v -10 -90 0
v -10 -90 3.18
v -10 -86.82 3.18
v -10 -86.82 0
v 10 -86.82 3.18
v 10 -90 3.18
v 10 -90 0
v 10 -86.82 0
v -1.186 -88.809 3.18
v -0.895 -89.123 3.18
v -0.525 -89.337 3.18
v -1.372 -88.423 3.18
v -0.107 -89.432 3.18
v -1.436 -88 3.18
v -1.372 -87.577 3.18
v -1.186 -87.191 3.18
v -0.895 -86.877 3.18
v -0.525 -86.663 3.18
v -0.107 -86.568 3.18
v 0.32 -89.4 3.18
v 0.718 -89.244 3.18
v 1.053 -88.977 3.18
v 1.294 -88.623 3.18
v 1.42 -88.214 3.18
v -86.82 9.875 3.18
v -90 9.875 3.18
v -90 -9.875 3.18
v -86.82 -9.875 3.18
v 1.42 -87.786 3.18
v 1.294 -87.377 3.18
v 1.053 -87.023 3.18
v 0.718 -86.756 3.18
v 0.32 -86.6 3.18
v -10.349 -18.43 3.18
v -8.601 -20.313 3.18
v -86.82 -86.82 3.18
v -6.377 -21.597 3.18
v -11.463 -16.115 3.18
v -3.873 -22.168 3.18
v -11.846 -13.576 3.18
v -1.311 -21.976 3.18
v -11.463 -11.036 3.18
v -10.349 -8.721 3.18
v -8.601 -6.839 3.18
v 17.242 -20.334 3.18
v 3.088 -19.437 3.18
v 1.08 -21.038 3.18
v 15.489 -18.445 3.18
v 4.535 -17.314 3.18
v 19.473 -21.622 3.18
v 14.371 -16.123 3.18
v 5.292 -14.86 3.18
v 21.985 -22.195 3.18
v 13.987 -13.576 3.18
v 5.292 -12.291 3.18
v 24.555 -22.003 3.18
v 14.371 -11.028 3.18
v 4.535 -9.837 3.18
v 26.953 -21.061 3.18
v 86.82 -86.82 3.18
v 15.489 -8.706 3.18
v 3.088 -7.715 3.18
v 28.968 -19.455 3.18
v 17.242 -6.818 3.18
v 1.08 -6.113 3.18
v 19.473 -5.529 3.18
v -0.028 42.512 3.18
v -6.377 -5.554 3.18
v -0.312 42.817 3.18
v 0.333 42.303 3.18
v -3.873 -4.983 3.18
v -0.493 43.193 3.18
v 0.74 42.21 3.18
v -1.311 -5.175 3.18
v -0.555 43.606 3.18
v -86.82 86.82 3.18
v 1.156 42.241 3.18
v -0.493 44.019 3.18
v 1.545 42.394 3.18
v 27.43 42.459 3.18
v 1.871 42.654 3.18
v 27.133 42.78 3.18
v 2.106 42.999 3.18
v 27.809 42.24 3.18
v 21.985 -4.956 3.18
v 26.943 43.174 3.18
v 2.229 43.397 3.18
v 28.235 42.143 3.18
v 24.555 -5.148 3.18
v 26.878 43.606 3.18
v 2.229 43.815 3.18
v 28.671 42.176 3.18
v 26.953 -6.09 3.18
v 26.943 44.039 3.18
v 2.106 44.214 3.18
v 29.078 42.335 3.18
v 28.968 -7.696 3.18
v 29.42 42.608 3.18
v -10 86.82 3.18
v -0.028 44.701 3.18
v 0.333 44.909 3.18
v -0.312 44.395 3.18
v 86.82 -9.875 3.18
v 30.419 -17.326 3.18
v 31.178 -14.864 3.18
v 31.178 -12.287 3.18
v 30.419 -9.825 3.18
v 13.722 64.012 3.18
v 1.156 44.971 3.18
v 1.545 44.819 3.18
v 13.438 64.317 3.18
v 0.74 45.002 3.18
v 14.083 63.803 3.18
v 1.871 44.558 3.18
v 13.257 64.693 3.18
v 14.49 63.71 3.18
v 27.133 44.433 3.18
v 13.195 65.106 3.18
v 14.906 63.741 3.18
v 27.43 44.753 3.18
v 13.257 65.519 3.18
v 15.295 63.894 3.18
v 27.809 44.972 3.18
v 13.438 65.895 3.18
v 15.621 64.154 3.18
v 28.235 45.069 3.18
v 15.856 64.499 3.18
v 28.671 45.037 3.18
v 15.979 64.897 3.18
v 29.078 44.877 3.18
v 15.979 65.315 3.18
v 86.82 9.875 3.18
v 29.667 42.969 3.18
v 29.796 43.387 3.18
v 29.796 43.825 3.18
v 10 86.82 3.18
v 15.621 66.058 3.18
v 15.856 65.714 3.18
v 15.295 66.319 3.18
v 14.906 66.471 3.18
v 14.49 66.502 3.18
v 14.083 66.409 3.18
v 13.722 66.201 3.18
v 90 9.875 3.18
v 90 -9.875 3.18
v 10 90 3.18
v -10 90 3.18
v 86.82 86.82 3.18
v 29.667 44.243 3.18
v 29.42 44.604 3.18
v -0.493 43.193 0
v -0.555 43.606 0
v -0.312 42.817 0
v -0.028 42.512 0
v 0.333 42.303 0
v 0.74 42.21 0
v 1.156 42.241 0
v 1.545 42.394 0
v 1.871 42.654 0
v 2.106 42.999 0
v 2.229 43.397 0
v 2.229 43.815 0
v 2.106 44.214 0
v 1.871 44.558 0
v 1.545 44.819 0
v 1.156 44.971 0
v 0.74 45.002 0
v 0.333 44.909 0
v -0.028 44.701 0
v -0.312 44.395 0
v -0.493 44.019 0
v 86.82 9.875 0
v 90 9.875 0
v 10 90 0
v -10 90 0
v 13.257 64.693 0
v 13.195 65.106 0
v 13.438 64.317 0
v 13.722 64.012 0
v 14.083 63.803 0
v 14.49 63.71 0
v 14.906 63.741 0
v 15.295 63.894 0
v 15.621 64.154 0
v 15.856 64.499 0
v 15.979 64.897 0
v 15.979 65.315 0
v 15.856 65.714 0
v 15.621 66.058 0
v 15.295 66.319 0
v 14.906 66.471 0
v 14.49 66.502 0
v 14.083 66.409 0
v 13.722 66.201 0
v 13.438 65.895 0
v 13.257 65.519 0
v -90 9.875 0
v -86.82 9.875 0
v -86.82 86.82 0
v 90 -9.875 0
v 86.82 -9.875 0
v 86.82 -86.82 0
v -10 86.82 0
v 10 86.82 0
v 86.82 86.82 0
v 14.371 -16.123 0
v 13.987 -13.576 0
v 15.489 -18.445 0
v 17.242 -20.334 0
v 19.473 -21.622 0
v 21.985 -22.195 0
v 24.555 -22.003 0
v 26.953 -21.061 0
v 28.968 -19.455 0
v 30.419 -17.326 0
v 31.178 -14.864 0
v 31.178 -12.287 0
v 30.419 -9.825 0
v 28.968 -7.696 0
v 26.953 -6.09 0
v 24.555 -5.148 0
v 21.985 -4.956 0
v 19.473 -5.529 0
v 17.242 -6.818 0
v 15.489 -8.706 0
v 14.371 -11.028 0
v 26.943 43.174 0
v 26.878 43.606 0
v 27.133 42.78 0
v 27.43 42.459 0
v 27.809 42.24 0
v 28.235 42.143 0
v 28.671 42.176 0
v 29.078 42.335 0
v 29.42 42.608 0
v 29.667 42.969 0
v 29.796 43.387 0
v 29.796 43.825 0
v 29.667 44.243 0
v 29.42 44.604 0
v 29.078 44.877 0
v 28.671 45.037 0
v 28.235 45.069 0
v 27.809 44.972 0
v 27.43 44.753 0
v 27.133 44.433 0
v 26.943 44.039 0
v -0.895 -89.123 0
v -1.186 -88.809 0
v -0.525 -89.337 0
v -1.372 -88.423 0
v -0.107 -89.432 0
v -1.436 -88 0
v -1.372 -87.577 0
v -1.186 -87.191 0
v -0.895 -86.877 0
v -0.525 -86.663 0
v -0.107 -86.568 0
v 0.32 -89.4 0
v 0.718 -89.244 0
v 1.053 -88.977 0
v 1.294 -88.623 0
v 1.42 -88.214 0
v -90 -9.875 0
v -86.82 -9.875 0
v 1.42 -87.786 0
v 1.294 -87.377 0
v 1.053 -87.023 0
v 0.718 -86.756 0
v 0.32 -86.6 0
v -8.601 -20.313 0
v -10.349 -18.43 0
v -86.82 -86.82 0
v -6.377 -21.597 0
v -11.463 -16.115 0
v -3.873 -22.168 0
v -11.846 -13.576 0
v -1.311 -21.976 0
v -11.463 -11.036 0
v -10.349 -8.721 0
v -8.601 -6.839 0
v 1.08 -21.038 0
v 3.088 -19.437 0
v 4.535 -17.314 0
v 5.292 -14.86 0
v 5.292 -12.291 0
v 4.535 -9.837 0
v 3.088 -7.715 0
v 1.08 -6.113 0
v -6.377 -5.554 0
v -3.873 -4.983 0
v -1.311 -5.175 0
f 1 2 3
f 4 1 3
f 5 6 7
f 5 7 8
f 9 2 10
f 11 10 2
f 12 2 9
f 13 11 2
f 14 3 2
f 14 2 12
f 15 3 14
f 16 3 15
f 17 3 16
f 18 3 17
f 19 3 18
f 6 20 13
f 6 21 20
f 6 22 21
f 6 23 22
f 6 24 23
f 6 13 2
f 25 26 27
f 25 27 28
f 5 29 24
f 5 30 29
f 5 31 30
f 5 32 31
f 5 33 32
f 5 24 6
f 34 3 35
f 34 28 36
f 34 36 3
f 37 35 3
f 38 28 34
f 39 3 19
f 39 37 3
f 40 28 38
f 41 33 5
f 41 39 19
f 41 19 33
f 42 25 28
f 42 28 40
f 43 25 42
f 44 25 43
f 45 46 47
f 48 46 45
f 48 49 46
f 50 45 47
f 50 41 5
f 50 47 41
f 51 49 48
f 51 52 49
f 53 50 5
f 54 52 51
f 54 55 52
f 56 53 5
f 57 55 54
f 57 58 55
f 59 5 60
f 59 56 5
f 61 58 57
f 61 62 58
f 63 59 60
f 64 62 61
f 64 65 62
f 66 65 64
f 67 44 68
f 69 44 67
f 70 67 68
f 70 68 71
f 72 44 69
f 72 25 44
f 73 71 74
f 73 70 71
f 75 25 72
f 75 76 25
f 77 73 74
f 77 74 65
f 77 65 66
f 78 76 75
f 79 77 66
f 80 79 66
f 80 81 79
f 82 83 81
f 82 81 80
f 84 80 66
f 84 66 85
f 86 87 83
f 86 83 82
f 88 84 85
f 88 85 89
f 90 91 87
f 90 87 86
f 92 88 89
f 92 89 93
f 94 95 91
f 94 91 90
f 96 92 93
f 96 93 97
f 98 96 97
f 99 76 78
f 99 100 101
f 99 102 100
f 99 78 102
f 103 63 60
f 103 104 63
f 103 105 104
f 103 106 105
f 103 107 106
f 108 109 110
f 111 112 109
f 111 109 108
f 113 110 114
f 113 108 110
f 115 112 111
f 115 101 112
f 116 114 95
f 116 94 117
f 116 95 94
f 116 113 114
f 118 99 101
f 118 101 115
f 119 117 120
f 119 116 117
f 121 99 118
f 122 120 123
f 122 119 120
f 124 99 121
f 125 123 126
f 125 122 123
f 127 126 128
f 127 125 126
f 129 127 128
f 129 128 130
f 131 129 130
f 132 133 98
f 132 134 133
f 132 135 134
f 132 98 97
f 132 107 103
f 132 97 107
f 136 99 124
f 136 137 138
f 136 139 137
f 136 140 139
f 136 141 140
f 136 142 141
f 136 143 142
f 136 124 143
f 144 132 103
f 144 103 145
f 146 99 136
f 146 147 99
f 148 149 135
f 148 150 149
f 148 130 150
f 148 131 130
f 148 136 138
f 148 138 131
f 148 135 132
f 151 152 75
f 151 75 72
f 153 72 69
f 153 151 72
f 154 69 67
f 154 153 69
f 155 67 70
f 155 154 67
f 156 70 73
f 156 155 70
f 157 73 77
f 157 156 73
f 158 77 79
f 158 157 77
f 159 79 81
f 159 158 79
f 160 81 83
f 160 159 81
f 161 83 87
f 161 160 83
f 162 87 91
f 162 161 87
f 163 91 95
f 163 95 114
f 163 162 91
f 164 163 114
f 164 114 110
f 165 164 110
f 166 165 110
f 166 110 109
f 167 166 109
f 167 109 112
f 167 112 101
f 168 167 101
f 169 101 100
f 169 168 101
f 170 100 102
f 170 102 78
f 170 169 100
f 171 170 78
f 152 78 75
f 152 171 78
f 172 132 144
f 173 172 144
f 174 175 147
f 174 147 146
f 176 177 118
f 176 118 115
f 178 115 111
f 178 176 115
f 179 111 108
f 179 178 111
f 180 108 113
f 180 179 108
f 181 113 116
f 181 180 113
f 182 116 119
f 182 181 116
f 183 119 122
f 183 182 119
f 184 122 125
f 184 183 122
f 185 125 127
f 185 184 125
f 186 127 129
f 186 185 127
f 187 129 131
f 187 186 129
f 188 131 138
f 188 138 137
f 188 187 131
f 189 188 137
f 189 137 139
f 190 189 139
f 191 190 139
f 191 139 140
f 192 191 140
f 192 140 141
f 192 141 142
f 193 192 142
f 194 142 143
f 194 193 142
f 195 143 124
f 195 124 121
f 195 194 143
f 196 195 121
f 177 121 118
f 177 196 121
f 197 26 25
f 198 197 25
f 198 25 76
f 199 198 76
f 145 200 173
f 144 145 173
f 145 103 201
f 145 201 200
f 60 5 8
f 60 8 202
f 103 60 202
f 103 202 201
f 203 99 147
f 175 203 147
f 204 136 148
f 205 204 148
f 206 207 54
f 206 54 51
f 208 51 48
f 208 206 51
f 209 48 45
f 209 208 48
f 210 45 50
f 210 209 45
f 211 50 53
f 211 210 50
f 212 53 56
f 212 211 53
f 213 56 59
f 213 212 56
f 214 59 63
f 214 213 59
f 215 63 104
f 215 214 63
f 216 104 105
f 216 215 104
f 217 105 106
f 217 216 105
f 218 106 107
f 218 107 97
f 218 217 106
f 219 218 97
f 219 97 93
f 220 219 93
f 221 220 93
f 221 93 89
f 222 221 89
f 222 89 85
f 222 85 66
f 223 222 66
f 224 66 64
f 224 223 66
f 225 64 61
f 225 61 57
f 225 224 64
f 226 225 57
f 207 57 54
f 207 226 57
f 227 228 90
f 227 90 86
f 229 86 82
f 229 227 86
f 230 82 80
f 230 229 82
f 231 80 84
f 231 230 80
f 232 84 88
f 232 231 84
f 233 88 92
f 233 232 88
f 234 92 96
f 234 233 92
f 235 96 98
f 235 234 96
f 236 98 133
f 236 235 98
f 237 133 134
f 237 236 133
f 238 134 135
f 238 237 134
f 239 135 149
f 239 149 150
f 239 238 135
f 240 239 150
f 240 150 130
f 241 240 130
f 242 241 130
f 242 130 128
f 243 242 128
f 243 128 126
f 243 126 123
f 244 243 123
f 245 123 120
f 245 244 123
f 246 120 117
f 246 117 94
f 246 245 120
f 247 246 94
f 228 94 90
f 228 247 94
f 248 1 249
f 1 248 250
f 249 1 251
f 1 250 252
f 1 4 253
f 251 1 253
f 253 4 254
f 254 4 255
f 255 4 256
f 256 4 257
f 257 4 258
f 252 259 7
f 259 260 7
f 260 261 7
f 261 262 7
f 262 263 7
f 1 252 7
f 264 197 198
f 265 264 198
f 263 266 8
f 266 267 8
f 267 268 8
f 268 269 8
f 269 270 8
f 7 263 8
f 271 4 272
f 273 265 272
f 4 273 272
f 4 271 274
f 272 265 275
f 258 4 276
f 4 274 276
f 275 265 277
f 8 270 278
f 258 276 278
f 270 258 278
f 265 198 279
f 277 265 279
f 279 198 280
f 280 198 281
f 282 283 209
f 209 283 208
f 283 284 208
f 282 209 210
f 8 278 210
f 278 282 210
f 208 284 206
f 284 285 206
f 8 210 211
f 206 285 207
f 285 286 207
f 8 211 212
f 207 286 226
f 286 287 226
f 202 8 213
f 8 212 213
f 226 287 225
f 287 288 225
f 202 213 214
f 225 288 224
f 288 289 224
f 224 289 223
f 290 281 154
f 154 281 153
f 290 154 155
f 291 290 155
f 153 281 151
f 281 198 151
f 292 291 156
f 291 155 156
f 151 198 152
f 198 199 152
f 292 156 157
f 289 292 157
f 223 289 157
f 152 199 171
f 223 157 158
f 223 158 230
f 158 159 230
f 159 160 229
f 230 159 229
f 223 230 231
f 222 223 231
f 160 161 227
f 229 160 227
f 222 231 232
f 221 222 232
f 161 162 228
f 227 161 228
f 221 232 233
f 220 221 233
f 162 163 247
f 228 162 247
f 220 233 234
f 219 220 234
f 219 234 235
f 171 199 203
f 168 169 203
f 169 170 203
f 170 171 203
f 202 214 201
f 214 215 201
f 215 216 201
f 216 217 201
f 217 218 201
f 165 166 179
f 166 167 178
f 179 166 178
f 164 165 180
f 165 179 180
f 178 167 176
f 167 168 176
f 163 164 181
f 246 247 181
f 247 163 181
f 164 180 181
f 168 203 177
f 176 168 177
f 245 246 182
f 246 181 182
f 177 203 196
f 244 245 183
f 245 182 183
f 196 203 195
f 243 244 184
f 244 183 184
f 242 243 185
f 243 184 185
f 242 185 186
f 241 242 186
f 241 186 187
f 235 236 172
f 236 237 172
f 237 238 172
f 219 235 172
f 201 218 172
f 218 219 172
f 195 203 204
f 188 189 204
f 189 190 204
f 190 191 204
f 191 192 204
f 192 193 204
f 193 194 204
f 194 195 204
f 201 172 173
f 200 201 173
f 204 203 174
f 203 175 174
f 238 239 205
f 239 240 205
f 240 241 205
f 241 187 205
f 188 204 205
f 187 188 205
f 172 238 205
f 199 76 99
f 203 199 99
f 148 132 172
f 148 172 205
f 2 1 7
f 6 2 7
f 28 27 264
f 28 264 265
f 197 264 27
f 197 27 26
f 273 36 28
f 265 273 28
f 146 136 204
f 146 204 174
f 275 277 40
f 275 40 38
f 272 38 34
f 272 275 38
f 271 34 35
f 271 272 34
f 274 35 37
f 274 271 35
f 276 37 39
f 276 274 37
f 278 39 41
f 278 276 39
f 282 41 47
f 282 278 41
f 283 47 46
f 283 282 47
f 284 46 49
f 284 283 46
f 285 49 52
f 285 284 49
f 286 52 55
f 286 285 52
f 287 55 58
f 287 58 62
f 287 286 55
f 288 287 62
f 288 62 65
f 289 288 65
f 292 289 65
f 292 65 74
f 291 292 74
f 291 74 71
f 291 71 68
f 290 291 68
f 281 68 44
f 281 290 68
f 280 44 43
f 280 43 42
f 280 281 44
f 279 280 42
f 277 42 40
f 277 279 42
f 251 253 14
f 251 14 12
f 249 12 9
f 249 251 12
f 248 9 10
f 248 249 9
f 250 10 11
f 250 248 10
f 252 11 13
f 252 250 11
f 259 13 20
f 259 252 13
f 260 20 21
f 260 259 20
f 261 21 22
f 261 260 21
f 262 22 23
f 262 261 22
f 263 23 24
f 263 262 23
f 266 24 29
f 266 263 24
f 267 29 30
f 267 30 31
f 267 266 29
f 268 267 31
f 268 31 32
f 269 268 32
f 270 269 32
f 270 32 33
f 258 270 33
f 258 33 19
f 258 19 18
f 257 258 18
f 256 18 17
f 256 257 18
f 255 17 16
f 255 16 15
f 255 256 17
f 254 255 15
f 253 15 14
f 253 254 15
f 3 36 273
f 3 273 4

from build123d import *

# Parameters (mm, degrees)
SKETCH3_W           = 180
SKETCH3_H           = 180
SKETCH3_R           = 8.616960002
SKETCH3_R_2         = 8.643887018
SKETCH3_R_3         = 1.43602308
SKETCH3_R_4         = 1.4
SKETCH3_R_5         = 1.467212263
BOSS_EXTRUDE1_DEPTH = 3.18
SKETCH4_W           = 80
SKETCH4_H           = 3.18
CUT_EXTRUDE1_DEPTH  = 128.318939675
SKETCH5_W           = 3.18
SKETCH5_H           = 80.125
CUT_EXTRUDE2_DEPTH  = 128.318939675


with BuildPart() as part:
    # Sketch3 → Boss-Extrude1 (new body)
    with BuildSketch(Plane.XY):
        Rectangle(SKETCH3_W, SKETCH3_H)
        with Locations(Location((-3.22889268, -13.57556396, 0), (0, 0, 180))):
            Circle(SKETCH3_R, mode=Mode.SUBTRACT)
        with Locations(Location((22.63110732, -13.57556396, 0), (0, 0, 180))):
            Circle(SKETCH3_R_2, mode=Mode.SUBTRACT)
        with Locations(Location((0, -88, 0), (0, 0, 180))):
            Circle(SKETCH3_R_3, mode=Mode.SUBTRACT)
        with Locations(Location((0.844873764, 43.606084924, 0), (0, 0, 180))):
            Circle(SKETCH3_R_4, mode=Mode.SUBTRACT)
        with Locations(Location((14.594873764, 65.106084924, 0), (0, 0, 180))):
            Circle(SKETCH3_R_4, mode=Mode.SUBTRACT)
        with Locations(Location((28.344873764, 43.606084924, 0), (0, 0, 180))):
            Circle(SKETCH3_R_5, mode=Mode.SUBTRACT)
    extrude(amount=BOSS_EXTRUDE1_DEPTH)

    # Sketch4 → Cut-Extrude1 (cut, through all)
    with BuildSketch(Plane.XY.offset(3.18)):
        with Locations((50, -88.41)):
            Rectangle(SKETCH4_W, SKETCH4_H)
        with Locations((-50, 88.41)):
            Rectangle(SKETCH4_W, SKETCH4_H)
        with Locations((50, 88.41)):
            Rectangle(SKETCH4_W, SKETCH4_H)
        with Locations((-50, -88.41)):
            Rectangle(SKETCH4_W, SKETCH4_H)
    extrude(amount=-CUT_EXTRUDE1_DEPTH, mode=Mode.SUBTRACT)

    # Sketch5 → Cut-Extrude2 (cut, through all)
    with BuildSketch(Plane.XY.offset(3.18)):
        with Locations((-88.41, 49.9375)):
            Rectangle(SKETCH5_W, SKETCH5_H)
        with Locations((-88.41, -49.9375)):
            Rectangle(SKETCH5_W, SKETCH5_H)
        with Locations((88.41, -49.9375)):
            Rectangle(SKETCH5_W, SKETCH5_H)
        with Locations((88.41, 49.9375)):
            Rectangle(SKETCH5_W, SKETCH5_H)
    extrude(amount=-CUT_EXTRUDE2_DEPTH, mode=Mode.SUBTRACT)


solid = part.part
